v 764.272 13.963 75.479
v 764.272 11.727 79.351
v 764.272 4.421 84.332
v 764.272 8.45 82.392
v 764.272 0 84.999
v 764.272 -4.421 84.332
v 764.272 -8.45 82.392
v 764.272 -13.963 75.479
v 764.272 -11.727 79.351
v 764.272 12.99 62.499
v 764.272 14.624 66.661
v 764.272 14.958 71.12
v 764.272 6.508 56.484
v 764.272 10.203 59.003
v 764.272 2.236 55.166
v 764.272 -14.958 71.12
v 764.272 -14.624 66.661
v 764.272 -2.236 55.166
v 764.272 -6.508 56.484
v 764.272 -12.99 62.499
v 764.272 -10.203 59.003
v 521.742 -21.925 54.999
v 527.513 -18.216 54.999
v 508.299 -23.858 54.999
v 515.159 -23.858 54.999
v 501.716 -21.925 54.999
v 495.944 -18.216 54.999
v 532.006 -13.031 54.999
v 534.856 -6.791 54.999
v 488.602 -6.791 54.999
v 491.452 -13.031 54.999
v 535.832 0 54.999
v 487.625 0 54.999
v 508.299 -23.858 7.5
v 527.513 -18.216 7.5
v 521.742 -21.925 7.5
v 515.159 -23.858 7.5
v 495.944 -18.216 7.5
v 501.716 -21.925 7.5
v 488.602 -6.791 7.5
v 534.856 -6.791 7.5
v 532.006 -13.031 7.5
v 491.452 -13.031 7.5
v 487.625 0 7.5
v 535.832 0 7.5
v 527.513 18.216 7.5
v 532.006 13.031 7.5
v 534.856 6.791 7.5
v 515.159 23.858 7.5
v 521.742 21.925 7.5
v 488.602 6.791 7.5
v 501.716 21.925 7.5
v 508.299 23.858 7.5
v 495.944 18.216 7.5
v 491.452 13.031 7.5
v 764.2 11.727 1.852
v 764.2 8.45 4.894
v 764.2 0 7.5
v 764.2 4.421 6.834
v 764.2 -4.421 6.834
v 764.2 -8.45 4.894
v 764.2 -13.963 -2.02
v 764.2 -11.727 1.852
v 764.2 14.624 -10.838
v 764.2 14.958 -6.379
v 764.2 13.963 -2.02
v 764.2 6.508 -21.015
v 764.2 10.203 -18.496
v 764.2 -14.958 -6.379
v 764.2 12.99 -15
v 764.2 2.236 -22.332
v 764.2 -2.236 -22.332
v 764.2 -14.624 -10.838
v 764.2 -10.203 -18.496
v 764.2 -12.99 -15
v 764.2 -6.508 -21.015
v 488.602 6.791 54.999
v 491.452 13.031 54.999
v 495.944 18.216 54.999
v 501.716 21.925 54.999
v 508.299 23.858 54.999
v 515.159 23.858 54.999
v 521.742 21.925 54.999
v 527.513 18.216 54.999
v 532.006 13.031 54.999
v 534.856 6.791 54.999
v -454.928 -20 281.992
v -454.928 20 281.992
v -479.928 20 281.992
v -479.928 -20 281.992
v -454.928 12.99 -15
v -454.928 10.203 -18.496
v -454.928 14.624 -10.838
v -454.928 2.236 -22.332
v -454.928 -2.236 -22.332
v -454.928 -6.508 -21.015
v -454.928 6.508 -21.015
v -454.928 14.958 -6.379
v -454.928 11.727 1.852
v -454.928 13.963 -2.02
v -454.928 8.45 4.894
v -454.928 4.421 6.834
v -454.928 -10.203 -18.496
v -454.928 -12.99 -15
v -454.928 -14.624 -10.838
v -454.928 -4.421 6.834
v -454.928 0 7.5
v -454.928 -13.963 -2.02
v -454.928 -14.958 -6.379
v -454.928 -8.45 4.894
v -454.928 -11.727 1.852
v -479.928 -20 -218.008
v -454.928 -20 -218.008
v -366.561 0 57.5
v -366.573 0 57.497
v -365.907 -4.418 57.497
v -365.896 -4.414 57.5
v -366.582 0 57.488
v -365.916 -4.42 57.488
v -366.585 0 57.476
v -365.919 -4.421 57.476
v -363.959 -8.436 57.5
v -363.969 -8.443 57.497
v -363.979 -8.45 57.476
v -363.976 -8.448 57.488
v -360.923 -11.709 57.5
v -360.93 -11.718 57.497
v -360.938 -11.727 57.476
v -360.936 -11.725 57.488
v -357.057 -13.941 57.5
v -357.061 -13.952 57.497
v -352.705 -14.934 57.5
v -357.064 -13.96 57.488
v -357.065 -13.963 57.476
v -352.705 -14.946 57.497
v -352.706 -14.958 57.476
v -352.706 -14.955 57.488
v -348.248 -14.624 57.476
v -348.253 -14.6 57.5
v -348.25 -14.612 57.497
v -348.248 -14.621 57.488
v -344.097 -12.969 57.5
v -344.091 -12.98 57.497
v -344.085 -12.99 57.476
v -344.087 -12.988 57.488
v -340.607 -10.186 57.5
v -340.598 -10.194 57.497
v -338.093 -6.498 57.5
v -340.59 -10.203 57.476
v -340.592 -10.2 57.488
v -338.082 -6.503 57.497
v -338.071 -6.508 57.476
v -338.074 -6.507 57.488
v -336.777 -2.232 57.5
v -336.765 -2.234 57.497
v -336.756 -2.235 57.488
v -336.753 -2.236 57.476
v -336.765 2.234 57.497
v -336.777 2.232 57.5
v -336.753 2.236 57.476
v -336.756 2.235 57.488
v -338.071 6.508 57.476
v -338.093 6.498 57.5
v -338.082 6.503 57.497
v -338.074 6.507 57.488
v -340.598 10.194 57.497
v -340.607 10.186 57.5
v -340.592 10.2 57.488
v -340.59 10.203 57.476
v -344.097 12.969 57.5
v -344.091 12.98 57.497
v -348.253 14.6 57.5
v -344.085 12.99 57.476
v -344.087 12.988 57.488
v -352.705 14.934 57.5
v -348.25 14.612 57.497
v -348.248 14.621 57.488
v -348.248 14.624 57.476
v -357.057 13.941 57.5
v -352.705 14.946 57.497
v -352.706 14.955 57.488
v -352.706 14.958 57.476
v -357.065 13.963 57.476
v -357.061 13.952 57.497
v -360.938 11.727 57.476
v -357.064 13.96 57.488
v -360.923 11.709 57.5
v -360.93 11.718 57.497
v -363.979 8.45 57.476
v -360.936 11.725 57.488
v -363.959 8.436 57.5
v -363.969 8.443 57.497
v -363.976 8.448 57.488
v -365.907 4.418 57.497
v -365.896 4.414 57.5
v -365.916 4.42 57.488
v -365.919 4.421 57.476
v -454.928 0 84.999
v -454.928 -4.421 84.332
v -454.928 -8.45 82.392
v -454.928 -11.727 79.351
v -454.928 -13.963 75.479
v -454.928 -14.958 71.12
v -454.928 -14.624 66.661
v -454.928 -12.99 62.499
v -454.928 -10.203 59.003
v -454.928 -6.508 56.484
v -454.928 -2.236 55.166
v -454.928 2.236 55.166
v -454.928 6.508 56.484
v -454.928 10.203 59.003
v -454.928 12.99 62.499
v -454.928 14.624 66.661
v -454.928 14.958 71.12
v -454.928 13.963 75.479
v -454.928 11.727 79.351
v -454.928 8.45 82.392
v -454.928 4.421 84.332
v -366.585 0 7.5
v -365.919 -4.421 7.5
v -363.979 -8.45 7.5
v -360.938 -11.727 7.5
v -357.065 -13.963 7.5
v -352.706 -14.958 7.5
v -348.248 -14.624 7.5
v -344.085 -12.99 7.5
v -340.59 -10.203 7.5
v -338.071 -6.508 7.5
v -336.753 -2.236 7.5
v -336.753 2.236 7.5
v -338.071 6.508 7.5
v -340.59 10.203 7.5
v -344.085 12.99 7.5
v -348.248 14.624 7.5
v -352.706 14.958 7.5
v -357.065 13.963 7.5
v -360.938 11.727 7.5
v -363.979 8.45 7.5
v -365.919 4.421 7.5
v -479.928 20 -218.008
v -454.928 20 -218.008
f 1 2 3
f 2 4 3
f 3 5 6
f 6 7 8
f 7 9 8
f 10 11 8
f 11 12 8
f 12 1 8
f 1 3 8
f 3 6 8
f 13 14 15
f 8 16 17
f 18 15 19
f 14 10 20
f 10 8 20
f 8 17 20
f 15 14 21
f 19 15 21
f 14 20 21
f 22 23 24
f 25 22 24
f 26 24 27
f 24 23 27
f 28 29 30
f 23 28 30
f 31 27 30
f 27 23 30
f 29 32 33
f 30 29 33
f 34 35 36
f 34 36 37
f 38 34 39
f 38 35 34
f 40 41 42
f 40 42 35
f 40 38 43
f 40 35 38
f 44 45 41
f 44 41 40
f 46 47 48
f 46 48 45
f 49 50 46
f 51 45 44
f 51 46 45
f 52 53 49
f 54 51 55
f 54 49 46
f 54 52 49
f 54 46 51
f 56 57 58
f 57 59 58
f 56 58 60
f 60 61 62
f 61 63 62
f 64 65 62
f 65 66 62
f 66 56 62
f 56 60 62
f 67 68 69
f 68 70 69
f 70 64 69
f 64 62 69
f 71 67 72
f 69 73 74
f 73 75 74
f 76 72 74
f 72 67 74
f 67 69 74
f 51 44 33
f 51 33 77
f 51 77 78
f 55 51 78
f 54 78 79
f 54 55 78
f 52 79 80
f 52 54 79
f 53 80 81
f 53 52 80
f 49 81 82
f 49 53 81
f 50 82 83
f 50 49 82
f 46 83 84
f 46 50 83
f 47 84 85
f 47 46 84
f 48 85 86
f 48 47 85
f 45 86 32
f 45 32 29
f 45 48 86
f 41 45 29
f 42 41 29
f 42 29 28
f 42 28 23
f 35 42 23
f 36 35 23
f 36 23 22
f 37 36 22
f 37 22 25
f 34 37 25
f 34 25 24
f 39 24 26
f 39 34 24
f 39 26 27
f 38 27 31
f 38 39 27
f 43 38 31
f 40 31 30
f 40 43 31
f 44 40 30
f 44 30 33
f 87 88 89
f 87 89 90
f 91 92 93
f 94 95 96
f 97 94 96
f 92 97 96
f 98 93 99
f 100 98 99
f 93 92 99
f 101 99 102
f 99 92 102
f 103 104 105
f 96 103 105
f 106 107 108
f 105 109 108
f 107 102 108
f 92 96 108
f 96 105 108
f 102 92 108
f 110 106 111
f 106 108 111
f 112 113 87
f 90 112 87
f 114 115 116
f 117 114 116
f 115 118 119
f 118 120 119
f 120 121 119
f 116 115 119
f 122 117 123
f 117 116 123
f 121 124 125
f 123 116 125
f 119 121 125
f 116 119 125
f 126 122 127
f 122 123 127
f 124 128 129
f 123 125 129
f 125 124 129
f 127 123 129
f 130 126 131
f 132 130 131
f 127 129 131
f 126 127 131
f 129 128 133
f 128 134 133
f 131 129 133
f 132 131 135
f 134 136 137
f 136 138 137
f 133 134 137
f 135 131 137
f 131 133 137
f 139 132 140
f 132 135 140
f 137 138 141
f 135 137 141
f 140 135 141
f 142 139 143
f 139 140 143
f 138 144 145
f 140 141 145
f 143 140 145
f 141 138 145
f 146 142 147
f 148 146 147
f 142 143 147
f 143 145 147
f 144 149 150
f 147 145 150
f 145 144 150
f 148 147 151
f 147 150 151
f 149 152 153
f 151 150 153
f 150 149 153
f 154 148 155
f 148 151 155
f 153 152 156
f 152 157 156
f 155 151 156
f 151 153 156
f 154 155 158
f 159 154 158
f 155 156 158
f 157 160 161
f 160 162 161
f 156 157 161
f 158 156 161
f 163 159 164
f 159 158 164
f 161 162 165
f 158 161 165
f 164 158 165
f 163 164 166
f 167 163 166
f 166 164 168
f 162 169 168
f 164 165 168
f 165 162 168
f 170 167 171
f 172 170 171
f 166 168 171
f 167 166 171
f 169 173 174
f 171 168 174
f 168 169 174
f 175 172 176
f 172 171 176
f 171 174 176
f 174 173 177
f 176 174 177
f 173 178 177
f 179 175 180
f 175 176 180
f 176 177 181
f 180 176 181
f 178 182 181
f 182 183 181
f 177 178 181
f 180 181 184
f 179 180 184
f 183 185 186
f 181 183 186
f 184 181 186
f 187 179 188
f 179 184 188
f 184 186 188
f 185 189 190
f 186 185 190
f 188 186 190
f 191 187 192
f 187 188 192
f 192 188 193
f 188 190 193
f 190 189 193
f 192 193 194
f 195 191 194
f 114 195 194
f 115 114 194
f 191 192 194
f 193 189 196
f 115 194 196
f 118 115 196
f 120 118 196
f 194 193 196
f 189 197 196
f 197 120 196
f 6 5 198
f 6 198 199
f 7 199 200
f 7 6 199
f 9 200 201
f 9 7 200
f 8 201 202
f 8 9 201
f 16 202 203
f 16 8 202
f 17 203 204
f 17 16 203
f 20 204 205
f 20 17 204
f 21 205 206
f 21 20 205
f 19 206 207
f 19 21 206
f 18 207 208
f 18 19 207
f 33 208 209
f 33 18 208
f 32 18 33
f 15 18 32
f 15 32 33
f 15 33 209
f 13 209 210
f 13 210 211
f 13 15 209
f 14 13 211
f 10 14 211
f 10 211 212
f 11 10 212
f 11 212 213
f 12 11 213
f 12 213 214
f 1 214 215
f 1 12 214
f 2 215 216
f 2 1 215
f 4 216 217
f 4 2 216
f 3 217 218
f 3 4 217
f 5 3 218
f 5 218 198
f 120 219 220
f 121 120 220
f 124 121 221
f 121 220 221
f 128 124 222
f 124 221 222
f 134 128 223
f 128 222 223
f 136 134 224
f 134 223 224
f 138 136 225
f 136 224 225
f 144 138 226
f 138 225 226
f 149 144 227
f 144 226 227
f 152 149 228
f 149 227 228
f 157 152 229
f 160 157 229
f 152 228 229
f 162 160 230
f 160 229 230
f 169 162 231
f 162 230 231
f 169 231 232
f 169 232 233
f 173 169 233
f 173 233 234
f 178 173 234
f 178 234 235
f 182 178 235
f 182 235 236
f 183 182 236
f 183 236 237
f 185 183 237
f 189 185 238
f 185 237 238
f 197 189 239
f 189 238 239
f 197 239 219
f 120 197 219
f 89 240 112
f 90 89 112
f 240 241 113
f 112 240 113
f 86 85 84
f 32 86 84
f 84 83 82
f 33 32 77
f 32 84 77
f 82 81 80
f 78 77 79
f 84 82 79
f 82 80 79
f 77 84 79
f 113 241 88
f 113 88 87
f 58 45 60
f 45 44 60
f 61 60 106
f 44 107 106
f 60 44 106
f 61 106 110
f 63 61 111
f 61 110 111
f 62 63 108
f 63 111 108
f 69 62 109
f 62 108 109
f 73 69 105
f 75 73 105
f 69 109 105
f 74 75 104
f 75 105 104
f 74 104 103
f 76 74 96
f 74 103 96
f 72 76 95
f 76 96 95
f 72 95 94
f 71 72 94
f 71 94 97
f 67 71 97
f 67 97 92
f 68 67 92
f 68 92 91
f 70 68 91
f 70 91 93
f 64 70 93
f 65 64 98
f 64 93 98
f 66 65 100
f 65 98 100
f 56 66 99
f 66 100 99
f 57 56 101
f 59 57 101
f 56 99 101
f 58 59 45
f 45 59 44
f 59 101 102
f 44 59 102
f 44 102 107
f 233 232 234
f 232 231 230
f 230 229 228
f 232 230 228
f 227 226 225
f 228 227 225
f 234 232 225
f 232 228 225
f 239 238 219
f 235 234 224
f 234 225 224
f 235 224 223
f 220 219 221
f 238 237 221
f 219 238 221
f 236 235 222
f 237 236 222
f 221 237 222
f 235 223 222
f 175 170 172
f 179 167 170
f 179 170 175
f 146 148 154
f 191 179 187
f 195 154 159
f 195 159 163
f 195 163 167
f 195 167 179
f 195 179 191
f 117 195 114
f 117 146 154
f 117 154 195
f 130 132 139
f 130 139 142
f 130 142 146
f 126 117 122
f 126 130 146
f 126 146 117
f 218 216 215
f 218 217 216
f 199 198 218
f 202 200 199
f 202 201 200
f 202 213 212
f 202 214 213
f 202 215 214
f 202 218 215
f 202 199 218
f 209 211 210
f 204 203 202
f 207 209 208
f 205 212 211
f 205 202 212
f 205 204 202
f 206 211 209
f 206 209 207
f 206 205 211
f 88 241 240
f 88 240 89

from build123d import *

# Parameters (mm, degrees)
F0_W     = 1219.2
F0_H     = 15
F0_W_2   = 15
F0_H_2   = 47.4986740947
F0_H_3   = 2.5013259053
F0_W_3   = 24.1035435881
F0_H_4   = 22.4986740947
F0_H_5   = 25
F5_R     = 0.0241421356
F6_W     = 40
F6_H     = 500
F7_DEPTH = 25


with BuildPart() as f1:
    # F0 (on Front) → F1 (revolve)
    with BuildSketch(Plane.XZ):
        with Locations((154.6719521284, 77.4986740947)):
            Rectangle(F0_W, F0_H)
    revolve(axis=Axis((154.6719521284, 0, 69.9986740947), (1, 0, 0)))



with BuildPart() as f2:
    # F0 (on Front) → F2 (revolve)
    with BuildSketch(Plane.XZ):
        Polygon((-454.9280478716, -7.5), (764.2, -7.5), (764.2, 7.5), (535.8324178628, 7.5), (511.7288742747, 7.5), (487.6253306866, 7.5), (-336.5853738785, 7.5), (-351.5853738785, 7.5), (-366.5853738785, 7.5), (-454.9280478716, 7.5), align=None)
    revolve(axis=Axis((154.6359760642, 0, -7.5), (1, 0, 0)))


with BuildPart() as f3:
    # F0 (on Front) → F3 (revolve)
    with BuildSketch(Plane.XZ):
        with Locations((-359.0853738785, 31.2493370473)):
            Rectangle(F0_W_2, F0_H_2)
        with Locations((-359.0853738785, 56.2493370473)):
            Rectangle(F0_W_2, F0_H_3)
    revolve(axis=Axis((-351.5853738785, 0, 32.5), (0, 0, 1)))

    # F5
    f5_edges = [f3.edges().sort_by_distance(p)[0] for p in [
        (-336.585374, 0, 57.5),
    ]]
    fillet(f5_edges, radius=F5_R)


with BuildPart() as f1_1:
    add(f1.part)

    add(f2.part)  # F4 merges F2
    # F0 (on Front) → F4 (revolve)
    with BuildSketch(Plane.XZ):
        with Locations((499.6771024806, 43.7493370473)):
            Rectangle(F0_W_3, F0_H_4)
        with Locations((499.6771024806, 20)):
            Rectangle(F0_W_3, F0_H_5)
    revolve(axis=Axis((511.7288742747, 0, 32.5), (0, 0, -1)))


with BuildPart() as f7:
    # F6 (on face) → F7 (new body)
    with BuildSketch(Plane(origin=(-454.9280478716, 0, 0), x_dir=(0, -1, 0), z_dir=(-1, 0, 0))):
        with Locations((0, 31.9915090998)):
            Rectangle(F6_W, F6_H)
    extrude(amount=F7_DEPTH)


solid = Compound([f3.part, f1_1.part, f7.part])
